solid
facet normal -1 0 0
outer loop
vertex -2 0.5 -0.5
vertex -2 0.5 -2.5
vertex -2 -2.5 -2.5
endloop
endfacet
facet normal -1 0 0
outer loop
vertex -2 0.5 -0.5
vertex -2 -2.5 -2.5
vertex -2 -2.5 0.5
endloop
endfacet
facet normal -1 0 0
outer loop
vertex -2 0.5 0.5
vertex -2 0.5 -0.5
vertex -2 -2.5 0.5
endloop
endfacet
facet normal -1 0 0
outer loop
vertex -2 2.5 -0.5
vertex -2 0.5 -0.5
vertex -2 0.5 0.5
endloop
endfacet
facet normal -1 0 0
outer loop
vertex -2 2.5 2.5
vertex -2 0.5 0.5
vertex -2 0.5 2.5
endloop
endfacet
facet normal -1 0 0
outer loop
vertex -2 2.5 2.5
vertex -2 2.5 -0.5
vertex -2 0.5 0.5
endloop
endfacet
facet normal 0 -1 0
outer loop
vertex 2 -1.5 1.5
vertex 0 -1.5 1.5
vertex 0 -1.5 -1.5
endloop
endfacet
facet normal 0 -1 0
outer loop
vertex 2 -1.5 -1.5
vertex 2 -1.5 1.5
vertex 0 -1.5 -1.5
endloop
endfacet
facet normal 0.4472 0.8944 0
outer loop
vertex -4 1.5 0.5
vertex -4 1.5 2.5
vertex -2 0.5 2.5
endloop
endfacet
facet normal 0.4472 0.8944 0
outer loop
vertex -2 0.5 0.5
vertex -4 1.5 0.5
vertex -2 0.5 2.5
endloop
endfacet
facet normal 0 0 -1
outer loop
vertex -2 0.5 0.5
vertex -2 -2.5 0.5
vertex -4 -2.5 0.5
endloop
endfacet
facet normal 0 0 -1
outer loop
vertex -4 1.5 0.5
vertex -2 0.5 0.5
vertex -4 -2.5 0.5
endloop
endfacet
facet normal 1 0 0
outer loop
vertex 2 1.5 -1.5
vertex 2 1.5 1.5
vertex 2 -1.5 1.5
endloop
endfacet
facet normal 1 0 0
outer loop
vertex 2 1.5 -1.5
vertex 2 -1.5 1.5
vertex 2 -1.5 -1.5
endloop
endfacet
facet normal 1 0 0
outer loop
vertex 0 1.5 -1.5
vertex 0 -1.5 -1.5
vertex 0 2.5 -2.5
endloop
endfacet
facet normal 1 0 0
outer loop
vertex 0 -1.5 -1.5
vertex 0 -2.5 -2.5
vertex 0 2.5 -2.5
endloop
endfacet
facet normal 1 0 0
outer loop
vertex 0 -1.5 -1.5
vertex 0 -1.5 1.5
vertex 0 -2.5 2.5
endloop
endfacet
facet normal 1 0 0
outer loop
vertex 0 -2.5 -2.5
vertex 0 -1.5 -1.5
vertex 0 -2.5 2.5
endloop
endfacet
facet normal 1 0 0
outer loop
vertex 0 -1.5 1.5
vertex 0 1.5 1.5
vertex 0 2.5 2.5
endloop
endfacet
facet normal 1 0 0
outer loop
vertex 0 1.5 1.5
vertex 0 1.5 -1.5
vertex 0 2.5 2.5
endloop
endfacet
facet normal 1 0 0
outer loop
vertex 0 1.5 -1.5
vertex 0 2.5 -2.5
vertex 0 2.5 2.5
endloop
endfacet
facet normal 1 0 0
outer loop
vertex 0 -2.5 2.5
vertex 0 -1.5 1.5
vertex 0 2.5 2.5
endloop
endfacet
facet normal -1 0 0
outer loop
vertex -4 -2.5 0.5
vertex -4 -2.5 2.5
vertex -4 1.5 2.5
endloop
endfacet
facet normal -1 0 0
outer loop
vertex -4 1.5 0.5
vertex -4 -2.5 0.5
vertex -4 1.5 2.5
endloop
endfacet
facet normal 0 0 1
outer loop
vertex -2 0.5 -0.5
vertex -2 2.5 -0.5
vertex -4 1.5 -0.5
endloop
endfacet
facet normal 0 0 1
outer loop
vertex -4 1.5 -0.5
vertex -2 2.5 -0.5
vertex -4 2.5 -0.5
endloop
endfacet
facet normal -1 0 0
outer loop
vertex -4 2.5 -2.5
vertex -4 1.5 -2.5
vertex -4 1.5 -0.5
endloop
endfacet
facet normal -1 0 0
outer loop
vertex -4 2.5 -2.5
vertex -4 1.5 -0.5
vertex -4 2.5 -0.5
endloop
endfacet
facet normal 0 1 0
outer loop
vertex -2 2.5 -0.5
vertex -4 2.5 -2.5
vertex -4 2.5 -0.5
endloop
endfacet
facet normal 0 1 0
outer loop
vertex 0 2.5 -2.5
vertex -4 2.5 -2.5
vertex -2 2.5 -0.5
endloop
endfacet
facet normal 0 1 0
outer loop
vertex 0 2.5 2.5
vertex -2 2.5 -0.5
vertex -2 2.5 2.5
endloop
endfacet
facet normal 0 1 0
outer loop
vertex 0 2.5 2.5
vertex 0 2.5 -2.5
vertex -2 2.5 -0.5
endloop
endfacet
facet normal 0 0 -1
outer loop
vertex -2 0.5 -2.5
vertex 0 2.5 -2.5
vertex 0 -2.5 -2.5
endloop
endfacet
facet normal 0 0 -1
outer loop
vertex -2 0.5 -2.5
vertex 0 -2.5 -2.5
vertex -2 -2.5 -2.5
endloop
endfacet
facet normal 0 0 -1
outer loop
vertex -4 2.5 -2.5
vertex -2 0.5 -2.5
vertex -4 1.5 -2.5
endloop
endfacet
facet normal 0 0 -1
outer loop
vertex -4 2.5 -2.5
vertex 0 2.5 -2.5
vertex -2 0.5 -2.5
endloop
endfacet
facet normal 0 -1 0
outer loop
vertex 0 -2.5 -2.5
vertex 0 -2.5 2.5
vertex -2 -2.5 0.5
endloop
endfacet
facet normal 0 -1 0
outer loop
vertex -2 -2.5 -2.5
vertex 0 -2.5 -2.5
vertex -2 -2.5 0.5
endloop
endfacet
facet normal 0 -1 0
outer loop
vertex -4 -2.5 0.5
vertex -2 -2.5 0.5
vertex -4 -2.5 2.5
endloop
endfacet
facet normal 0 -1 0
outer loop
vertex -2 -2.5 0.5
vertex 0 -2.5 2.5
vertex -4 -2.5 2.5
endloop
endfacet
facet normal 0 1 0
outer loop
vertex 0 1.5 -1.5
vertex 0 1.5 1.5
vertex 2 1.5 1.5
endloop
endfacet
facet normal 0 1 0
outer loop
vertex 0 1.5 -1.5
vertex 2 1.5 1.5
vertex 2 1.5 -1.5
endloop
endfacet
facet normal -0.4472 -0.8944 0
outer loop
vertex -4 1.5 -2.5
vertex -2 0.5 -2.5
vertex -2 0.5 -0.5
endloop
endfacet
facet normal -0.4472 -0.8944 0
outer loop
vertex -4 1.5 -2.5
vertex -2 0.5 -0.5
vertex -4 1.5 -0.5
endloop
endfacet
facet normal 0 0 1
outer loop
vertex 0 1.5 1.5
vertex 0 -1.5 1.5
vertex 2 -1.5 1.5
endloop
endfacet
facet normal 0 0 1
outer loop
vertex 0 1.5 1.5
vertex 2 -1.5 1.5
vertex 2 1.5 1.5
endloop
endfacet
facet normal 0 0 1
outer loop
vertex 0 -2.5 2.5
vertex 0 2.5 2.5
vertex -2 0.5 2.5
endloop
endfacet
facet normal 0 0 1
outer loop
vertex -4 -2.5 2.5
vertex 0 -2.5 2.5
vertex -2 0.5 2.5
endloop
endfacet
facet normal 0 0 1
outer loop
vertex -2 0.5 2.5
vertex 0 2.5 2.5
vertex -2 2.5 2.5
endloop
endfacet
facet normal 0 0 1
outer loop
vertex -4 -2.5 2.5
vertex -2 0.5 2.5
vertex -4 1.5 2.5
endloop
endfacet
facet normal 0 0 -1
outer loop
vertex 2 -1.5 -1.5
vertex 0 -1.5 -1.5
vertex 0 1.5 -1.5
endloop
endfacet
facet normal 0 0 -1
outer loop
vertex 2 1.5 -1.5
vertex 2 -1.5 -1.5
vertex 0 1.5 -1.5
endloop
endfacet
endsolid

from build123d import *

# Parameters (mm, degrees)
SKETCH1_W           = 3
SKETCH1_H           = 3
BOSS_EXTRUDE1_DEPTH = 2
SKETCH2_W           = 5
SKETCH2_H           = 5
BOSS_EXTRUDE2_DEPTH = 2
BOSS_EXTRUDE3_DEPTH = 2
BOSS_EXTRUDE4_DEPTH = 2


with BuildPart() as part:
    # Sketch1 → Boss-Extrude1 (new body)
    with BuildSketch(Plane(origin=(0, 0, 0), x_dir=(0, 0, -1), z_dir=(1, 0, 0))):
        Rectangle(SKETCH1_W, SKETCH1_H)
    extrude(amount=BOSS_EXTRUDE1_DEPTH)

    # Sketch2 → Boss-Extrude2 (add)
    with BuildSketch(Plane.ZY):
        Rectangle(SKETCH2_W, SKETCH2_H)
    extrude(amount=BOSS_EXTRUDE2_DEPTH)

    # Sketch4 → Boss-Extrude3 (add)
    with BuildSketch(Plane.XY.offset(2.5)):
        Polygon((-2, -2.5), (-4, -2.5), (-4, 1.5), (-2, 0.5), align=None)
    extrude(amount=-BOSS_EXTRUDE3_DEPTH)

    # Sketch5 → Boss-Extrude4 (add)
    with BuildSketch(Plane(origin=(0, 0, -2.5), x_dir=(-1, 0, 0), z_dir=(0, 0, -1))):
        Polygon((2, 2.5), (2, 0.5), (4, 1.5), (4, 2.5), align=None)
    extrude(amount=-BOSS_EXTRUDE4_DEPTH)


solid = part.part
